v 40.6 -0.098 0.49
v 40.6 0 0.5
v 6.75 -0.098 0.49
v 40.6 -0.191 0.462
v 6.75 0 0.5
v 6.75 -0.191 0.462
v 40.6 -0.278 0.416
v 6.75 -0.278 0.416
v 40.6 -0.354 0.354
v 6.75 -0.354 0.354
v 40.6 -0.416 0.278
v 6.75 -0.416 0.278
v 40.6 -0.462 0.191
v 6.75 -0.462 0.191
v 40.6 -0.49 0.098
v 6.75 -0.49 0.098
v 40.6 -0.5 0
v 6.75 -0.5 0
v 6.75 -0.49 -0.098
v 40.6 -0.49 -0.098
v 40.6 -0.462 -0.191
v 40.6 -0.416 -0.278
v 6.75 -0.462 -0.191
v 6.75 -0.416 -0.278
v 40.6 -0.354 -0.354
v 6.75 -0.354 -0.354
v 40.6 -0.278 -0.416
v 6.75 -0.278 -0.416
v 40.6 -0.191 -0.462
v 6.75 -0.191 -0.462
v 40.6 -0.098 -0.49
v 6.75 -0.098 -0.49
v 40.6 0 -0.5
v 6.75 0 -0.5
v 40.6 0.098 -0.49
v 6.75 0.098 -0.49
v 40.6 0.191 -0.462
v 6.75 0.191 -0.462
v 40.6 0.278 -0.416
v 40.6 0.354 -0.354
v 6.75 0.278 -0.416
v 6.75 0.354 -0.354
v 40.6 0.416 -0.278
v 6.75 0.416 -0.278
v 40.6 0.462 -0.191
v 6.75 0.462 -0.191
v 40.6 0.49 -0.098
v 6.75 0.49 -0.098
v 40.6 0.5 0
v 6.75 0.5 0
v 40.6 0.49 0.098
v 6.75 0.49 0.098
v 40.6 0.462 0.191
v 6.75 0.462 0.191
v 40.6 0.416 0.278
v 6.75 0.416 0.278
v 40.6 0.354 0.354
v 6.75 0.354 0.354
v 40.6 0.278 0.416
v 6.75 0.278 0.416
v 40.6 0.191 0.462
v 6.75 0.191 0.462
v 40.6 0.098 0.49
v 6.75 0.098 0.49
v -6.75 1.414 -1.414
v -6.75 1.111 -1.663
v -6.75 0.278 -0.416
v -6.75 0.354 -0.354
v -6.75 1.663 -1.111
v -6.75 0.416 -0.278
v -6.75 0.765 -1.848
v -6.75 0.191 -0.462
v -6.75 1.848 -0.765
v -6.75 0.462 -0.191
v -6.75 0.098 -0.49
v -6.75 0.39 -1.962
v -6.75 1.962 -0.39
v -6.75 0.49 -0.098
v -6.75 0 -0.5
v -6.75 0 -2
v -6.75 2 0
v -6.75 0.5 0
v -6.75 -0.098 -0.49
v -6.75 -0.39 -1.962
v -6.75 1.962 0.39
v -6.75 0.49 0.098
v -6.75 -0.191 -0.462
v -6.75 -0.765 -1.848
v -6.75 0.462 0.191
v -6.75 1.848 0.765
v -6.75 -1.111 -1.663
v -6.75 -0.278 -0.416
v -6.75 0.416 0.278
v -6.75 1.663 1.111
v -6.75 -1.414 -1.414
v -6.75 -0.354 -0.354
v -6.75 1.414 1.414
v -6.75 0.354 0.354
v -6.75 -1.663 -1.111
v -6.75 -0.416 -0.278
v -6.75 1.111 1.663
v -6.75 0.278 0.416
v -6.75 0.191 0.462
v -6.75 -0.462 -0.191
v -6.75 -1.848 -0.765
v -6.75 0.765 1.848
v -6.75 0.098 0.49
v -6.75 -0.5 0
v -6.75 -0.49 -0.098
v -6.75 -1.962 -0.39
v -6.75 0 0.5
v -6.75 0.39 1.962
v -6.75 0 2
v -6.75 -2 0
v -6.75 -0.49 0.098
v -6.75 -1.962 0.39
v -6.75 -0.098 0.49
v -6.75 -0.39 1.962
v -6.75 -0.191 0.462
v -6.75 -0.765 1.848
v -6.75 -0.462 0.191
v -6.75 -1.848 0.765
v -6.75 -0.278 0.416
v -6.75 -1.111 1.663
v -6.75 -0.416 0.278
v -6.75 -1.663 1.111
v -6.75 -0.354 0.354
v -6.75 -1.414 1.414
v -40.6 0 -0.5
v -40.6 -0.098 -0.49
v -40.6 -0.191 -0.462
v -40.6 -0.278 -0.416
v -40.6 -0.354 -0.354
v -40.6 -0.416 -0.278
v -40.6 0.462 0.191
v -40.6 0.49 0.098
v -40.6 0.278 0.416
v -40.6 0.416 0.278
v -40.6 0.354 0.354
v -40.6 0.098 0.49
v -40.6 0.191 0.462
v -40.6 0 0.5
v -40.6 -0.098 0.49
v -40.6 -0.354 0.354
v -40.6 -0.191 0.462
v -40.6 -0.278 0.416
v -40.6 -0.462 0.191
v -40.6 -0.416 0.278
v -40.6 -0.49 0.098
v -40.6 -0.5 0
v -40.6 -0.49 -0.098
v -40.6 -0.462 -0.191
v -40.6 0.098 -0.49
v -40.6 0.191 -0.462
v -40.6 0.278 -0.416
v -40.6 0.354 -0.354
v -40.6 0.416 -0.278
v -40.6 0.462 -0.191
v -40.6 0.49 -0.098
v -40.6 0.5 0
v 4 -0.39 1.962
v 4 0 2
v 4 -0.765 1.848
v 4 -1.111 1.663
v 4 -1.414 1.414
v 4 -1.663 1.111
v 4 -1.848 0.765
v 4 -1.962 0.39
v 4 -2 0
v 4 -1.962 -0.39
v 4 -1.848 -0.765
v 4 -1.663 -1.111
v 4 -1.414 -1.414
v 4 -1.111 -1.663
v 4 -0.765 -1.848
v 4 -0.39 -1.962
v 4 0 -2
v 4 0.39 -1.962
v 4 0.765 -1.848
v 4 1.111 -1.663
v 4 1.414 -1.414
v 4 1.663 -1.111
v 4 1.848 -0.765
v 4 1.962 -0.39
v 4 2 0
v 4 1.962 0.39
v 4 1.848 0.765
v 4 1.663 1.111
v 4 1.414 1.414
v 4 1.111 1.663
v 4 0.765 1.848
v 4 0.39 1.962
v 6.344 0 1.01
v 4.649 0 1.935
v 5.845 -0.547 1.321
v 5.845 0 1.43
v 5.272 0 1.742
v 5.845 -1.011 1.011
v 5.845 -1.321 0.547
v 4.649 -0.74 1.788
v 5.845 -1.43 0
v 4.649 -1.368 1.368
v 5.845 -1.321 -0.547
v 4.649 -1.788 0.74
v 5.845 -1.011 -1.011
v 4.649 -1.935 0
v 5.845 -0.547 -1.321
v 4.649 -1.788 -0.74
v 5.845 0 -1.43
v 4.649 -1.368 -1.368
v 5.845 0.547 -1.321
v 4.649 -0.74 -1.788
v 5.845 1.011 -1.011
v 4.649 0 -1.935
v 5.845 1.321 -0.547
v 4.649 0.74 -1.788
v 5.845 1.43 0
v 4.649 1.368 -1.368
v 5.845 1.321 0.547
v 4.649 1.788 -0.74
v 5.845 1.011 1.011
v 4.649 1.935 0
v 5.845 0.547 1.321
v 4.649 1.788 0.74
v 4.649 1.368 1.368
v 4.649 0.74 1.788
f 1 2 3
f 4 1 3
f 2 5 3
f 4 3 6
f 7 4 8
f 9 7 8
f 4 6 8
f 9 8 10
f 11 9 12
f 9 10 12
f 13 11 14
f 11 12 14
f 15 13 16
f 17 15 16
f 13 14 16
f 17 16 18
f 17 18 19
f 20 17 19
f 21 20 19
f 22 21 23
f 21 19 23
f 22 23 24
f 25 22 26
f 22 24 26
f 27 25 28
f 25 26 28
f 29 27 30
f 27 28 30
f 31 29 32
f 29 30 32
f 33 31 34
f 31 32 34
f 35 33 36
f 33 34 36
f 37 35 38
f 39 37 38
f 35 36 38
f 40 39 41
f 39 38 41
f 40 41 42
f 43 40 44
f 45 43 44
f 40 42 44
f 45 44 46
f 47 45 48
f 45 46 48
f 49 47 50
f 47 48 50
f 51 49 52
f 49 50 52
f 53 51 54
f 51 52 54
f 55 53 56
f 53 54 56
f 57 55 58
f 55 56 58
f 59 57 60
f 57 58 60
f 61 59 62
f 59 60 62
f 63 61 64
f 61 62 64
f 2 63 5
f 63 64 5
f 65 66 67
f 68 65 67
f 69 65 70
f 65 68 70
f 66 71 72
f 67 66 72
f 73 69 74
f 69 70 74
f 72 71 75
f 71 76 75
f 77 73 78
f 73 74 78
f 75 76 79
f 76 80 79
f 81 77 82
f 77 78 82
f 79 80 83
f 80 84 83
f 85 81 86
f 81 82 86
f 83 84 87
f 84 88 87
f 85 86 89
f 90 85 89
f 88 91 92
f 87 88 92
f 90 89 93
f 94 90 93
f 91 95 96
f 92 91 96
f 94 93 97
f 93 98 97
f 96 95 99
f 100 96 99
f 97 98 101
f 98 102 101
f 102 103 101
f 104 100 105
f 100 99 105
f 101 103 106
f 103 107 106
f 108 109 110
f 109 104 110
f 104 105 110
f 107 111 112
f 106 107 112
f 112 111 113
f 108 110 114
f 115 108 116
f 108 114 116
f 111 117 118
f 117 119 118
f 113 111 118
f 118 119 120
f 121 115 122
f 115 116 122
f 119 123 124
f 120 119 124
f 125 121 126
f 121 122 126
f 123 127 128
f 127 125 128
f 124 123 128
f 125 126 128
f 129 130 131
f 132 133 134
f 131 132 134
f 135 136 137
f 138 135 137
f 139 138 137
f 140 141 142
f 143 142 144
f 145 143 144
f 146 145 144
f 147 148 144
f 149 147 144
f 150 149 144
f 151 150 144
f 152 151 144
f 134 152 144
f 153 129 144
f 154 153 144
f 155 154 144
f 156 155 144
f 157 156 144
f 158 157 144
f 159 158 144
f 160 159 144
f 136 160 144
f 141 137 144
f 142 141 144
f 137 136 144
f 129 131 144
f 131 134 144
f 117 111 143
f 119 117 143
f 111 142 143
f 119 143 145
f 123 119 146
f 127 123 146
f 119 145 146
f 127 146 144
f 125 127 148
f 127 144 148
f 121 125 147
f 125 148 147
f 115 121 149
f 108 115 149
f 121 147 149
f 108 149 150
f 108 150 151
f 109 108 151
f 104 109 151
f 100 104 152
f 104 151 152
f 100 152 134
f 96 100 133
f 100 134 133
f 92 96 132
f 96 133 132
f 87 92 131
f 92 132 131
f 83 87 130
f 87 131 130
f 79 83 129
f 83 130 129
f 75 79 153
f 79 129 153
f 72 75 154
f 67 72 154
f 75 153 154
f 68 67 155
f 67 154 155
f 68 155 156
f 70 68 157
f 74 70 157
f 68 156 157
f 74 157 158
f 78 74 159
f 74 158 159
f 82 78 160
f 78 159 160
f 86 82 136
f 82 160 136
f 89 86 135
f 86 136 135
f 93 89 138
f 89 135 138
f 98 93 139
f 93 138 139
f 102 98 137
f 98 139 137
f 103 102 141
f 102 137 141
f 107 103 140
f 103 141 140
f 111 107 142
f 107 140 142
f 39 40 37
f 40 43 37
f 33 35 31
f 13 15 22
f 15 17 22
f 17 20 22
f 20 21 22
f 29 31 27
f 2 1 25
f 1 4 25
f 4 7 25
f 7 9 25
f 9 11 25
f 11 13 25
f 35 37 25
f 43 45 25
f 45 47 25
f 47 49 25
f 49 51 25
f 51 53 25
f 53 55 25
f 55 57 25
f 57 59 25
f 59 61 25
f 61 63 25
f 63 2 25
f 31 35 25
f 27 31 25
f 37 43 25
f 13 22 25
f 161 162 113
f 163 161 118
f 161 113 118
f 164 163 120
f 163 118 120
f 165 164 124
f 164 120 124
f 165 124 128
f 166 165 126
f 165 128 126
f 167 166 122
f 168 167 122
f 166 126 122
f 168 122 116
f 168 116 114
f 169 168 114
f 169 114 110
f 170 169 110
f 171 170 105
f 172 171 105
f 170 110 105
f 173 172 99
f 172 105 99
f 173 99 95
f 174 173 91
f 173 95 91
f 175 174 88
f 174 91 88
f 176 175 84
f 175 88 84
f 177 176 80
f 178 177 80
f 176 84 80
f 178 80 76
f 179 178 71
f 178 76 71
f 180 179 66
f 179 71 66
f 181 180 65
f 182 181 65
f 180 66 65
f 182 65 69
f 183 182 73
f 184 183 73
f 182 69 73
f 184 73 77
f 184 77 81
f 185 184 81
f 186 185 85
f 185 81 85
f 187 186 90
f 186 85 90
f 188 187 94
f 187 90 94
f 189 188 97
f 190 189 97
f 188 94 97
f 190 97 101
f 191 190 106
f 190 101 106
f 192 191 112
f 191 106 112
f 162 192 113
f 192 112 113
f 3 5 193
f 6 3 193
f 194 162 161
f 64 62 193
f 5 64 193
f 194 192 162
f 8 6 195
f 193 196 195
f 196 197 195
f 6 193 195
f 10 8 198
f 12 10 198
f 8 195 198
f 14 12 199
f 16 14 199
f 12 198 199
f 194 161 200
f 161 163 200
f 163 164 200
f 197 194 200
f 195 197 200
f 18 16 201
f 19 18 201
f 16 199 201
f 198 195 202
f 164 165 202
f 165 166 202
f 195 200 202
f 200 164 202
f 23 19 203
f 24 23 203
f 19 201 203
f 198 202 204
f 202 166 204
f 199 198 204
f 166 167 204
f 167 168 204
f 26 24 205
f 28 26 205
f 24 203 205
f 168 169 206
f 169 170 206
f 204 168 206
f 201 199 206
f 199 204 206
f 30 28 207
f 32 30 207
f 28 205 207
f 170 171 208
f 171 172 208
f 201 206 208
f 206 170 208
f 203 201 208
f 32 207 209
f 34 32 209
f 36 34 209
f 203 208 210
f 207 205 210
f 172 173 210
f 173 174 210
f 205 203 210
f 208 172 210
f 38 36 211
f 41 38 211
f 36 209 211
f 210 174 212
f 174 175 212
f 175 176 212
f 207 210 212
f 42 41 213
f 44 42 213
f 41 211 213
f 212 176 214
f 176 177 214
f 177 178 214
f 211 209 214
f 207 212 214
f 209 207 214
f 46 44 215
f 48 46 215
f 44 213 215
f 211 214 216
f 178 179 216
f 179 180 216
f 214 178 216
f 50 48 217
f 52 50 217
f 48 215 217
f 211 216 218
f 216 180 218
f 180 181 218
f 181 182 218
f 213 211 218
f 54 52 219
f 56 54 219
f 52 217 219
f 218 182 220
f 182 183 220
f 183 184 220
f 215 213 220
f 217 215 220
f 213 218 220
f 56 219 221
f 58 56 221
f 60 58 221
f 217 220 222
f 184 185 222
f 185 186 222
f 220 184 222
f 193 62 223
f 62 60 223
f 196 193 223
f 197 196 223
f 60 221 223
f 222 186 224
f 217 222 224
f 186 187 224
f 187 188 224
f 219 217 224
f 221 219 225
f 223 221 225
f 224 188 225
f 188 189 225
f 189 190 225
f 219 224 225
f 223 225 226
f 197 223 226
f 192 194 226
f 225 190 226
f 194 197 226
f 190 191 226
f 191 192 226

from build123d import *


with BuildPart() as f1:
    # F0 (on Front) → F1 (revolve)
    with BuildSketch(Plane.XZ):
        with BuildLine():
            Line((-40.6, 0.5), (-40.6, 0))
            Line((-40.6, 0), (-6.75, 0))
            Line((-6.75, 0), (0, 0))
            Line((0, 0), (6.75, 0))
            Line((6.75, 0), (40.6, 0))
            Line((40.6, 0), (40.6, 0.5))
            Line((40.6, 0.5), (6.75, 0.5))
            ThreePointArc((6.75, 0.5), (5.566246, 1.600617), (4, 2))
            Line((4, 2), (0, 2))
            Line((0, 2), (-6.75, 2))
            Line((-6.75, 2), (-6.75, 0.5))
            Line((-6.75, 0.5), (-40.6, 0.5))
        make_face()
    revolve(axis=Axis((-3.375, 0, 0), (1, 0, 0)))


solid = f1.part
